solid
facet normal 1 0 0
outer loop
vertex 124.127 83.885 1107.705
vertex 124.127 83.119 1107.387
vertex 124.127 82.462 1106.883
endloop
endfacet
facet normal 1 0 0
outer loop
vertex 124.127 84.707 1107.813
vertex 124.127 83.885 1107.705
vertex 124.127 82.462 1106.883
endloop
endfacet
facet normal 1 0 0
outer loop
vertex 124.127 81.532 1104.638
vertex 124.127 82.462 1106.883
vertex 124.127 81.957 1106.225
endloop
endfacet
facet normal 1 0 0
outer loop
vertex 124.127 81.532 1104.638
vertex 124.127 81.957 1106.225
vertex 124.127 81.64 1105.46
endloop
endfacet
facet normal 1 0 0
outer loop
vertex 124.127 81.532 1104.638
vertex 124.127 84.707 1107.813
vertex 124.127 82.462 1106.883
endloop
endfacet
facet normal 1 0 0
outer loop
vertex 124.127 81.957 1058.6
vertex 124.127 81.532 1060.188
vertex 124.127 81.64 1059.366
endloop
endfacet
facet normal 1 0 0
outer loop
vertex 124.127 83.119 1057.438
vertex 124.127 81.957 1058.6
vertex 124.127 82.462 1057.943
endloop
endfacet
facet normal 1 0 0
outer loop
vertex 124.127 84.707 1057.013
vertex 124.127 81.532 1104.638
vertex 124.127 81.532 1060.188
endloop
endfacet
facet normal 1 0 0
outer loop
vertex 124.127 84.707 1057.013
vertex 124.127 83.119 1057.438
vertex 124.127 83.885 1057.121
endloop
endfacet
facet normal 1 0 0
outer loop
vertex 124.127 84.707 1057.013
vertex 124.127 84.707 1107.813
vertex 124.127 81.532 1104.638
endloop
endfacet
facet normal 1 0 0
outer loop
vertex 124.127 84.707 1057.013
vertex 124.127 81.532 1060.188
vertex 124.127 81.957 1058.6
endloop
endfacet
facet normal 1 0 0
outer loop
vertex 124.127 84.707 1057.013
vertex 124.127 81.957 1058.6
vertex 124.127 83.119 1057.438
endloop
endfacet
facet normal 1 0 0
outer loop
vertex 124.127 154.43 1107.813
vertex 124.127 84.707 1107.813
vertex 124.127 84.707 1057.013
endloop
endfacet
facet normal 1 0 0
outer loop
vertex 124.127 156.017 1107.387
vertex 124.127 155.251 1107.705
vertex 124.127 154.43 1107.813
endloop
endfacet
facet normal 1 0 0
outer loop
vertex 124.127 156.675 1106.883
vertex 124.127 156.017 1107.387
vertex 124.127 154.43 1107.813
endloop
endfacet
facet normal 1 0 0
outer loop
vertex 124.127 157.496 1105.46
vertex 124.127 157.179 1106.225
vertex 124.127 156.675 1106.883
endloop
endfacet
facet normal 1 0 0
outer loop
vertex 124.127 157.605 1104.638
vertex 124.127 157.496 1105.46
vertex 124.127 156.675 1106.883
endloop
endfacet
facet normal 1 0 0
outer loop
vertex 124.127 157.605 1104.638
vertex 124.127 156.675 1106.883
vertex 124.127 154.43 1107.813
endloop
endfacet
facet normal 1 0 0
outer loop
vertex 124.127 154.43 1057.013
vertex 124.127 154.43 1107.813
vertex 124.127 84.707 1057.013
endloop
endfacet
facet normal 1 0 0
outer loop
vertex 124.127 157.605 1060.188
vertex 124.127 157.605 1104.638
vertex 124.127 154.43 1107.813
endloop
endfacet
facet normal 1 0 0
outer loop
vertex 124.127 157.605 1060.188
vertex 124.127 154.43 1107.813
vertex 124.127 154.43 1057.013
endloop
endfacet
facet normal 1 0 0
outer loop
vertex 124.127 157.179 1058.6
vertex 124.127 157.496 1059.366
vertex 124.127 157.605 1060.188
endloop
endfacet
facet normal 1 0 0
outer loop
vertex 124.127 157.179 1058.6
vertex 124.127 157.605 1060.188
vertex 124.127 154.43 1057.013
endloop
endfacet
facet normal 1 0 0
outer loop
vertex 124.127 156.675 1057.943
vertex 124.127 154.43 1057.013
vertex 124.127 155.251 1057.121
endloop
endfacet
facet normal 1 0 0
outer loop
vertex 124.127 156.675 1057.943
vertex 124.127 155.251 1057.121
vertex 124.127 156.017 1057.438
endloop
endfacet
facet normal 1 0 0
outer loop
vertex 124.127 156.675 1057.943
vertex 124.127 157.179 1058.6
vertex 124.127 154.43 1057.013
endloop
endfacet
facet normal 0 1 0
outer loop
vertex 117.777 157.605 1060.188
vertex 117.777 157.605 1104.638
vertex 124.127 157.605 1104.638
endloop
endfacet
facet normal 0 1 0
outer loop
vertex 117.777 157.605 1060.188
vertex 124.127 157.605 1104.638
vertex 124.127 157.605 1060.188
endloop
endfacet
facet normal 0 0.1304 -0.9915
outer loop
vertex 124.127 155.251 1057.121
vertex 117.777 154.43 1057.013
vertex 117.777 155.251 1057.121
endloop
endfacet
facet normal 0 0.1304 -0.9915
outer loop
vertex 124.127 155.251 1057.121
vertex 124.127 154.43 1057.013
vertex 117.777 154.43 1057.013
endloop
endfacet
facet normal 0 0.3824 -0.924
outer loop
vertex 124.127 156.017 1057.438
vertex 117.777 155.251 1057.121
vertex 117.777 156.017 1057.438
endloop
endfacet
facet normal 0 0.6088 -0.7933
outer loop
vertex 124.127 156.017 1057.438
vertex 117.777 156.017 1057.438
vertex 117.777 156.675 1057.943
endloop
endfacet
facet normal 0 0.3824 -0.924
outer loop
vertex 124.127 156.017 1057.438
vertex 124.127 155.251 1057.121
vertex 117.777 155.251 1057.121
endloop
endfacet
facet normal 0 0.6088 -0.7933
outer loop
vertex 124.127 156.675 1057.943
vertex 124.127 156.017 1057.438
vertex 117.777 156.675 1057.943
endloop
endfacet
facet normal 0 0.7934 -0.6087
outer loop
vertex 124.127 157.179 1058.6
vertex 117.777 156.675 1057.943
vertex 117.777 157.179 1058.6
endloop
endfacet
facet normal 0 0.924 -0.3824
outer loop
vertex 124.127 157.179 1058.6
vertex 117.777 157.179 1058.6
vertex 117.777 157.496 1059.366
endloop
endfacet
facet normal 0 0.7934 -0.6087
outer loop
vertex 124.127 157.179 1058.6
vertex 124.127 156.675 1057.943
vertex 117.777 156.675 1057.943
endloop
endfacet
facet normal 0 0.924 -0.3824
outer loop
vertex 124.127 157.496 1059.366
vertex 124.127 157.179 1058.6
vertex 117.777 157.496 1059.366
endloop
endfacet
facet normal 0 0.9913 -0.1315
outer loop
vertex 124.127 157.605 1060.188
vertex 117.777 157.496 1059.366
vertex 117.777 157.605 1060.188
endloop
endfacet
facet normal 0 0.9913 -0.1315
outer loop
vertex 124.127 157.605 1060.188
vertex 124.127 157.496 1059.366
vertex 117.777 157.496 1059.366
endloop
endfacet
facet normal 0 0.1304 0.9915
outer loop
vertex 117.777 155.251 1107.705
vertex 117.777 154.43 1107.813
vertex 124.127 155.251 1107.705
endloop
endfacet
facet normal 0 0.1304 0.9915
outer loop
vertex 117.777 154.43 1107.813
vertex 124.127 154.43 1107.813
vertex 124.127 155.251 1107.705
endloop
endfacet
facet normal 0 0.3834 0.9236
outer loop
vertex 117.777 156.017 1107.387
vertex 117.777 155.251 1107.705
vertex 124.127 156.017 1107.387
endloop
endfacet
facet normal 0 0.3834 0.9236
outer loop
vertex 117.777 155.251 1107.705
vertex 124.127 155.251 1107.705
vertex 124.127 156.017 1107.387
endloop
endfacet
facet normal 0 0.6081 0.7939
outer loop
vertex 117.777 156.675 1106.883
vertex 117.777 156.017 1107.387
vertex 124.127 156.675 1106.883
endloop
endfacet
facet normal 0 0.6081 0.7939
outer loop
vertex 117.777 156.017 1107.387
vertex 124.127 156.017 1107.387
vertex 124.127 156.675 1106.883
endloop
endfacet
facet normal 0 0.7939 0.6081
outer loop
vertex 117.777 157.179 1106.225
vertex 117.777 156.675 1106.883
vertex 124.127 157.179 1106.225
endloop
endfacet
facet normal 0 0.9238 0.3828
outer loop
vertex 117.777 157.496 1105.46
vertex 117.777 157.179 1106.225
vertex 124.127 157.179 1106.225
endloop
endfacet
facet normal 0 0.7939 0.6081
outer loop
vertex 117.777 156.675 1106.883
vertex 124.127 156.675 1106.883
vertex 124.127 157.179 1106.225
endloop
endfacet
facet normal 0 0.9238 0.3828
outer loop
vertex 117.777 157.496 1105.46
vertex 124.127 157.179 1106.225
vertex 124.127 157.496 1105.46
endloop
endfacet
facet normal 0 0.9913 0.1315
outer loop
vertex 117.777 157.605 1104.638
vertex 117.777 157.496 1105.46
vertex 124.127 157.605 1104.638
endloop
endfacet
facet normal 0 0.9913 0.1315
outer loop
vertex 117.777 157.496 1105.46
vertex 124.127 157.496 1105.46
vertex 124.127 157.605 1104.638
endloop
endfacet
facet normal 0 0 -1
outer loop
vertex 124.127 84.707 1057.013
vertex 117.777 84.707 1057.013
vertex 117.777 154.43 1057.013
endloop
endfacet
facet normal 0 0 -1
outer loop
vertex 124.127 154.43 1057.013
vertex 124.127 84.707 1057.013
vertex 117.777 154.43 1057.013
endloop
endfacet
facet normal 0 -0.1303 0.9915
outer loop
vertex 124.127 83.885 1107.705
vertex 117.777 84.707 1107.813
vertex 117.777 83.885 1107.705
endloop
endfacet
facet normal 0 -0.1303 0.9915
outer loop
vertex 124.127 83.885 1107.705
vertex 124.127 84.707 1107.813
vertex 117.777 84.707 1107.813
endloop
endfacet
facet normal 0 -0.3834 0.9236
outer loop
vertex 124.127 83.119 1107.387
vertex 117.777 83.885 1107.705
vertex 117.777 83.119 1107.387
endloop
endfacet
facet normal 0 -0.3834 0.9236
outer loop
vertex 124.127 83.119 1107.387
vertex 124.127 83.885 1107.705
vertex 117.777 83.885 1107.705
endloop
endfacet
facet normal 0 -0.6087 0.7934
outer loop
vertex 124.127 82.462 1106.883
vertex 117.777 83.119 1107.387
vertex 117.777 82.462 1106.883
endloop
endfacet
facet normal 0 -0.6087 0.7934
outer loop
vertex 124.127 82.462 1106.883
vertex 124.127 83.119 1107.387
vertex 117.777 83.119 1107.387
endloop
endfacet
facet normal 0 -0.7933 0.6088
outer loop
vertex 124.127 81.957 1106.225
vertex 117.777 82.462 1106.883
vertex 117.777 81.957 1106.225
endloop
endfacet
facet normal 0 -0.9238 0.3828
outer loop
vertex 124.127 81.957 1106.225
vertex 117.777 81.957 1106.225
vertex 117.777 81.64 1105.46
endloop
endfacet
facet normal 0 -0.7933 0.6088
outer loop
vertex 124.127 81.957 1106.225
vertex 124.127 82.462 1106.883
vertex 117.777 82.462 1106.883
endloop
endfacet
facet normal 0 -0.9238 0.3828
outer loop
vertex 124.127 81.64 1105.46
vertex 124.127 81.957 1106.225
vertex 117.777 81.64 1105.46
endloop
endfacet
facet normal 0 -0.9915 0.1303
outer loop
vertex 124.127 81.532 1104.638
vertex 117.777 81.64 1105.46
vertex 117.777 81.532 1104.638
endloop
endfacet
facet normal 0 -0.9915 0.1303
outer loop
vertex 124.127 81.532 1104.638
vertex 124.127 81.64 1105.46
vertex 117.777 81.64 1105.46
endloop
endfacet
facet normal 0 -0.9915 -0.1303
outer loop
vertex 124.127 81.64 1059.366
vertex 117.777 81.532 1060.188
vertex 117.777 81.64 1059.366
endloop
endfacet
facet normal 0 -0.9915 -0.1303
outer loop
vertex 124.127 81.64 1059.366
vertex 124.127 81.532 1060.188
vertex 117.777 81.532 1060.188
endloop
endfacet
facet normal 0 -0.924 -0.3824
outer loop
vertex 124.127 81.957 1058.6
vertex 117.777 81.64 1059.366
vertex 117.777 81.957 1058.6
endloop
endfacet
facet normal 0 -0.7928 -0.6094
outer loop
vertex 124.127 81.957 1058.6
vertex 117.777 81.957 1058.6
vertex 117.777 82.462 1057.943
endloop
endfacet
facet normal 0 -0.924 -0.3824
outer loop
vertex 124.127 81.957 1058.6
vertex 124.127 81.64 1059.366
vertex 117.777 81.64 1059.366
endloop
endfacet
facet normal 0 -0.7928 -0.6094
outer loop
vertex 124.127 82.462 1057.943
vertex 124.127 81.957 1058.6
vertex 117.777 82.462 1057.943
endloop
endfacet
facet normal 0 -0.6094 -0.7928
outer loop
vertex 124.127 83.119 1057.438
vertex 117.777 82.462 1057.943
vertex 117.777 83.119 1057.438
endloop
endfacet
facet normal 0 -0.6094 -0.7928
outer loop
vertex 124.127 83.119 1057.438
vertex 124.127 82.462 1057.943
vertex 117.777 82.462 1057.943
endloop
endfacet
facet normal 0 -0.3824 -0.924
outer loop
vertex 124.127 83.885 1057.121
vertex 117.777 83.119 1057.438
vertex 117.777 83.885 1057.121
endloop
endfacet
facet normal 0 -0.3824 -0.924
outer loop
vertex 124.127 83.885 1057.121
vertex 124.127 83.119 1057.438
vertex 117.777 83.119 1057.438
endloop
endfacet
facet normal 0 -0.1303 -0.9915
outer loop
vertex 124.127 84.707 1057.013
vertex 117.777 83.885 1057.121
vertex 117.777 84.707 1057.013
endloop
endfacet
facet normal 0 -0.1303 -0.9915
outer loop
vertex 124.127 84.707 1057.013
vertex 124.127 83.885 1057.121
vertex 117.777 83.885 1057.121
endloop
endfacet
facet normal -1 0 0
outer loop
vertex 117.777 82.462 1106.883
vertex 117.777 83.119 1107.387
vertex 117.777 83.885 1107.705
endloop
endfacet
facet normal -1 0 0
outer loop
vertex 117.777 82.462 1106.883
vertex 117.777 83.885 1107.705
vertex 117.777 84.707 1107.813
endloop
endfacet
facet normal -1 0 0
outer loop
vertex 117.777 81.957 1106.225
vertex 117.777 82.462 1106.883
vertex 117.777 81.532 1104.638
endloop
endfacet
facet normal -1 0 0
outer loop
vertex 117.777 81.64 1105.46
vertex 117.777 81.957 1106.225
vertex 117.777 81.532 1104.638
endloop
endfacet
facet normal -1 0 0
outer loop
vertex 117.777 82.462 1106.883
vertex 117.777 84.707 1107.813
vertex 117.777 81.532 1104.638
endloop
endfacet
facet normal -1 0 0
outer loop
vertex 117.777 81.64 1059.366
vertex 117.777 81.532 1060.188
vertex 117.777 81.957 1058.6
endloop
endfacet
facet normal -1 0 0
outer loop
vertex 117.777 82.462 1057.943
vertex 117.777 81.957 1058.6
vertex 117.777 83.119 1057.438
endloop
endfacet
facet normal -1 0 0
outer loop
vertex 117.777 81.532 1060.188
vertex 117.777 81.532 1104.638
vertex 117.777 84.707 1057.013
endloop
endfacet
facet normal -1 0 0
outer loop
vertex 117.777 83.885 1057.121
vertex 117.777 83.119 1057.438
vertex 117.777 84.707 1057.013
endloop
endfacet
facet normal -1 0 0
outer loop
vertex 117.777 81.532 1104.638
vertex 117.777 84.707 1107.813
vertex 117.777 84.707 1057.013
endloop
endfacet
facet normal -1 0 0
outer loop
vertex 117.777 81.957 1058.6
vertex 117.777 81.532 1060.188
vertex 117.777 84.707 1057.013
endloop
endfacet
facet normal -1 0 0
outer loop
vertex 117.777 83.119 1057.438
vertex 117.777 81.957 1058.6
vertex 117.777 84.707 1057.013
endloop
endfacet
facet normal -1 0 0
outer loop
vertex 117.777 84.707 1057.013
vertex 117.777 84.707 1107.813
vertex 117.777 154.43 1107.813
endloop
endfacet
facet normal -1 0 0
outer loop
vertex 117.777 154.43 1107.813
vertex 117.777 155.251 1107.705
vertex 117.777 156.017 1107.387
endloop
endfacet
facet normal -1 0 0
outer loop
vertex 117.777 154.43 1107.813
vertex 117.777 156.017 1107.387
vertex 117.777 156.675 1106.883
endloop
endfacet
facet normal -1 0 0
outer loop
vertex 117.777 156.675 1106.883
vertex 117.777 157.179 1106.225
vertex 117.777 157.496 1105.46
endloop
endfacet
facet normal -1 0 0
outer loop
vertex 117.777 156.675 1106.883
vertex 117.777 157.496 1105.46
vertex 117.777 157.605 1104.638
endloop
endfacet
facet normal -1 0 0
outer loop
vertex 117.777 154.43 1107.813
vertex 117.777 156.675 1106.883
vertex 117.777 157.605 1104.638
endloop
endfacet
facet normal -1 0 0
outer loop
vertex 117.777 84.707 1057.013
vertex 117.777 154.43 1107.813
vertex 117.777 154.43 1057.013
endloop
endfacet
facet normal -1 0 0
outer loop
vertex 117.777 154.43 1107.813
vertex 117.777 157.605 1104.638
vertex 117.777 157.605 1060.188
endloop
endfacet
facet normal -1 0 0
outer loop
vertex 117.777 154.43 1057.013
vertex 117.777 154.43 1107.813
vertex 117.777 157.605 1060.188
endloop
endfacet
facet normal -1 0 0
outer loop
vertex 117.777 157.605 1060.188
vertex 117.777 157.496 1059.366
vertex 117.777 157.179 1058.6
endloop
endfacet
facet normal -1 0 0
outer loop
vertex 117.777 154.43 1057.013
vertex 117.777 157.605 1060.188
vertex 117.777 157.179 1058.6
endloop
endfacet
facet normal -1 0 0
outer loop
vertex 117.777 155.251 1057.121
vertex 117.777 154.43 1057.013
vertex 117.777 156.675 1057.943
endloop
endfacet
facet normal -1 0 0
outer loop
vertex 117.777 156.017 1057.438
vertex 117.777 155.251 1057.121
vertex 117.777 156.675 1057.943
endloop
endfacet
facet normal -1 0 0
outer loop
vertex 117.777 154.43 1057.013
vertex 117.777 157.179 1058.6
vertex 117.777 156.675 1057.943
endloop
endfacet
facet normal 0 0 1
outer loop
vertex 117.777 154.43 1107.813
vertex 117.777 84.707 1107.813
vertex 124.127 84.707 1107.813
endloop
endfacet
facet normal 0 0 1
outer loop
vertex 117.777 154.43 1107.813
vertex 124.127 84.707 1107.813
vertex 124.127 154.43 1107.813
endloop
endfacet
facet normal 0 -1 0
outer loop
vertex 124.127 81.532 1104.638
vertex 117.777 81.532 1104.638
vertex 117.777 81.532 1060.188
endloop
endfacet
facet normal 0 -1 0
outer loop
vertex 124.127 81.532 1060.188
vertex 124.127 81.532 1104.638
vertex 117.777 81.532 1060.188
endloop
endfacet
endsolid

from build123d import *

# Parameters (mm, degrees)
BOSS_EXTRUDE1_START = 117.777002
SKETCH1_W           = 50.8
SKETCH1_H           = 76.073
BOSS_EXTRUDE1_DEPTH = 6.35
FILLET1_R           = 3.175


with BuildPart() as part:
    # Sketch1 → Boss-Extrude1 (new body)
    with BuildSketch(Plane(origin=(0, 0, 0), x_dir=(0, 0, -1), z_dir=(1, 0, 0)).offset(BOSS_EXTRUDE1_START)):
        with Locations((-1082.412834154, 119.568074554)):
            Rectangle(SKETCH1_W, SKETCH1_H)
    extrude(amount=BOSS_EXTRUDE1_DEPTH)

    # Fillet1
    fillet1_edges = [part.edges().sort_by_distance(p)[0] for p in [
        (120.952002, 81.531574554, 1057.012834154),
        (120.952002, 81.531574554, 1107.812834154),
        (120.952002, 157.604574554, 1107.812834154),
        (120.952002, 157.604574554, 1057.012834154),
    ]]
    fillet(fillet1_edges, radius=FILLET1_R)


solid = part.part
